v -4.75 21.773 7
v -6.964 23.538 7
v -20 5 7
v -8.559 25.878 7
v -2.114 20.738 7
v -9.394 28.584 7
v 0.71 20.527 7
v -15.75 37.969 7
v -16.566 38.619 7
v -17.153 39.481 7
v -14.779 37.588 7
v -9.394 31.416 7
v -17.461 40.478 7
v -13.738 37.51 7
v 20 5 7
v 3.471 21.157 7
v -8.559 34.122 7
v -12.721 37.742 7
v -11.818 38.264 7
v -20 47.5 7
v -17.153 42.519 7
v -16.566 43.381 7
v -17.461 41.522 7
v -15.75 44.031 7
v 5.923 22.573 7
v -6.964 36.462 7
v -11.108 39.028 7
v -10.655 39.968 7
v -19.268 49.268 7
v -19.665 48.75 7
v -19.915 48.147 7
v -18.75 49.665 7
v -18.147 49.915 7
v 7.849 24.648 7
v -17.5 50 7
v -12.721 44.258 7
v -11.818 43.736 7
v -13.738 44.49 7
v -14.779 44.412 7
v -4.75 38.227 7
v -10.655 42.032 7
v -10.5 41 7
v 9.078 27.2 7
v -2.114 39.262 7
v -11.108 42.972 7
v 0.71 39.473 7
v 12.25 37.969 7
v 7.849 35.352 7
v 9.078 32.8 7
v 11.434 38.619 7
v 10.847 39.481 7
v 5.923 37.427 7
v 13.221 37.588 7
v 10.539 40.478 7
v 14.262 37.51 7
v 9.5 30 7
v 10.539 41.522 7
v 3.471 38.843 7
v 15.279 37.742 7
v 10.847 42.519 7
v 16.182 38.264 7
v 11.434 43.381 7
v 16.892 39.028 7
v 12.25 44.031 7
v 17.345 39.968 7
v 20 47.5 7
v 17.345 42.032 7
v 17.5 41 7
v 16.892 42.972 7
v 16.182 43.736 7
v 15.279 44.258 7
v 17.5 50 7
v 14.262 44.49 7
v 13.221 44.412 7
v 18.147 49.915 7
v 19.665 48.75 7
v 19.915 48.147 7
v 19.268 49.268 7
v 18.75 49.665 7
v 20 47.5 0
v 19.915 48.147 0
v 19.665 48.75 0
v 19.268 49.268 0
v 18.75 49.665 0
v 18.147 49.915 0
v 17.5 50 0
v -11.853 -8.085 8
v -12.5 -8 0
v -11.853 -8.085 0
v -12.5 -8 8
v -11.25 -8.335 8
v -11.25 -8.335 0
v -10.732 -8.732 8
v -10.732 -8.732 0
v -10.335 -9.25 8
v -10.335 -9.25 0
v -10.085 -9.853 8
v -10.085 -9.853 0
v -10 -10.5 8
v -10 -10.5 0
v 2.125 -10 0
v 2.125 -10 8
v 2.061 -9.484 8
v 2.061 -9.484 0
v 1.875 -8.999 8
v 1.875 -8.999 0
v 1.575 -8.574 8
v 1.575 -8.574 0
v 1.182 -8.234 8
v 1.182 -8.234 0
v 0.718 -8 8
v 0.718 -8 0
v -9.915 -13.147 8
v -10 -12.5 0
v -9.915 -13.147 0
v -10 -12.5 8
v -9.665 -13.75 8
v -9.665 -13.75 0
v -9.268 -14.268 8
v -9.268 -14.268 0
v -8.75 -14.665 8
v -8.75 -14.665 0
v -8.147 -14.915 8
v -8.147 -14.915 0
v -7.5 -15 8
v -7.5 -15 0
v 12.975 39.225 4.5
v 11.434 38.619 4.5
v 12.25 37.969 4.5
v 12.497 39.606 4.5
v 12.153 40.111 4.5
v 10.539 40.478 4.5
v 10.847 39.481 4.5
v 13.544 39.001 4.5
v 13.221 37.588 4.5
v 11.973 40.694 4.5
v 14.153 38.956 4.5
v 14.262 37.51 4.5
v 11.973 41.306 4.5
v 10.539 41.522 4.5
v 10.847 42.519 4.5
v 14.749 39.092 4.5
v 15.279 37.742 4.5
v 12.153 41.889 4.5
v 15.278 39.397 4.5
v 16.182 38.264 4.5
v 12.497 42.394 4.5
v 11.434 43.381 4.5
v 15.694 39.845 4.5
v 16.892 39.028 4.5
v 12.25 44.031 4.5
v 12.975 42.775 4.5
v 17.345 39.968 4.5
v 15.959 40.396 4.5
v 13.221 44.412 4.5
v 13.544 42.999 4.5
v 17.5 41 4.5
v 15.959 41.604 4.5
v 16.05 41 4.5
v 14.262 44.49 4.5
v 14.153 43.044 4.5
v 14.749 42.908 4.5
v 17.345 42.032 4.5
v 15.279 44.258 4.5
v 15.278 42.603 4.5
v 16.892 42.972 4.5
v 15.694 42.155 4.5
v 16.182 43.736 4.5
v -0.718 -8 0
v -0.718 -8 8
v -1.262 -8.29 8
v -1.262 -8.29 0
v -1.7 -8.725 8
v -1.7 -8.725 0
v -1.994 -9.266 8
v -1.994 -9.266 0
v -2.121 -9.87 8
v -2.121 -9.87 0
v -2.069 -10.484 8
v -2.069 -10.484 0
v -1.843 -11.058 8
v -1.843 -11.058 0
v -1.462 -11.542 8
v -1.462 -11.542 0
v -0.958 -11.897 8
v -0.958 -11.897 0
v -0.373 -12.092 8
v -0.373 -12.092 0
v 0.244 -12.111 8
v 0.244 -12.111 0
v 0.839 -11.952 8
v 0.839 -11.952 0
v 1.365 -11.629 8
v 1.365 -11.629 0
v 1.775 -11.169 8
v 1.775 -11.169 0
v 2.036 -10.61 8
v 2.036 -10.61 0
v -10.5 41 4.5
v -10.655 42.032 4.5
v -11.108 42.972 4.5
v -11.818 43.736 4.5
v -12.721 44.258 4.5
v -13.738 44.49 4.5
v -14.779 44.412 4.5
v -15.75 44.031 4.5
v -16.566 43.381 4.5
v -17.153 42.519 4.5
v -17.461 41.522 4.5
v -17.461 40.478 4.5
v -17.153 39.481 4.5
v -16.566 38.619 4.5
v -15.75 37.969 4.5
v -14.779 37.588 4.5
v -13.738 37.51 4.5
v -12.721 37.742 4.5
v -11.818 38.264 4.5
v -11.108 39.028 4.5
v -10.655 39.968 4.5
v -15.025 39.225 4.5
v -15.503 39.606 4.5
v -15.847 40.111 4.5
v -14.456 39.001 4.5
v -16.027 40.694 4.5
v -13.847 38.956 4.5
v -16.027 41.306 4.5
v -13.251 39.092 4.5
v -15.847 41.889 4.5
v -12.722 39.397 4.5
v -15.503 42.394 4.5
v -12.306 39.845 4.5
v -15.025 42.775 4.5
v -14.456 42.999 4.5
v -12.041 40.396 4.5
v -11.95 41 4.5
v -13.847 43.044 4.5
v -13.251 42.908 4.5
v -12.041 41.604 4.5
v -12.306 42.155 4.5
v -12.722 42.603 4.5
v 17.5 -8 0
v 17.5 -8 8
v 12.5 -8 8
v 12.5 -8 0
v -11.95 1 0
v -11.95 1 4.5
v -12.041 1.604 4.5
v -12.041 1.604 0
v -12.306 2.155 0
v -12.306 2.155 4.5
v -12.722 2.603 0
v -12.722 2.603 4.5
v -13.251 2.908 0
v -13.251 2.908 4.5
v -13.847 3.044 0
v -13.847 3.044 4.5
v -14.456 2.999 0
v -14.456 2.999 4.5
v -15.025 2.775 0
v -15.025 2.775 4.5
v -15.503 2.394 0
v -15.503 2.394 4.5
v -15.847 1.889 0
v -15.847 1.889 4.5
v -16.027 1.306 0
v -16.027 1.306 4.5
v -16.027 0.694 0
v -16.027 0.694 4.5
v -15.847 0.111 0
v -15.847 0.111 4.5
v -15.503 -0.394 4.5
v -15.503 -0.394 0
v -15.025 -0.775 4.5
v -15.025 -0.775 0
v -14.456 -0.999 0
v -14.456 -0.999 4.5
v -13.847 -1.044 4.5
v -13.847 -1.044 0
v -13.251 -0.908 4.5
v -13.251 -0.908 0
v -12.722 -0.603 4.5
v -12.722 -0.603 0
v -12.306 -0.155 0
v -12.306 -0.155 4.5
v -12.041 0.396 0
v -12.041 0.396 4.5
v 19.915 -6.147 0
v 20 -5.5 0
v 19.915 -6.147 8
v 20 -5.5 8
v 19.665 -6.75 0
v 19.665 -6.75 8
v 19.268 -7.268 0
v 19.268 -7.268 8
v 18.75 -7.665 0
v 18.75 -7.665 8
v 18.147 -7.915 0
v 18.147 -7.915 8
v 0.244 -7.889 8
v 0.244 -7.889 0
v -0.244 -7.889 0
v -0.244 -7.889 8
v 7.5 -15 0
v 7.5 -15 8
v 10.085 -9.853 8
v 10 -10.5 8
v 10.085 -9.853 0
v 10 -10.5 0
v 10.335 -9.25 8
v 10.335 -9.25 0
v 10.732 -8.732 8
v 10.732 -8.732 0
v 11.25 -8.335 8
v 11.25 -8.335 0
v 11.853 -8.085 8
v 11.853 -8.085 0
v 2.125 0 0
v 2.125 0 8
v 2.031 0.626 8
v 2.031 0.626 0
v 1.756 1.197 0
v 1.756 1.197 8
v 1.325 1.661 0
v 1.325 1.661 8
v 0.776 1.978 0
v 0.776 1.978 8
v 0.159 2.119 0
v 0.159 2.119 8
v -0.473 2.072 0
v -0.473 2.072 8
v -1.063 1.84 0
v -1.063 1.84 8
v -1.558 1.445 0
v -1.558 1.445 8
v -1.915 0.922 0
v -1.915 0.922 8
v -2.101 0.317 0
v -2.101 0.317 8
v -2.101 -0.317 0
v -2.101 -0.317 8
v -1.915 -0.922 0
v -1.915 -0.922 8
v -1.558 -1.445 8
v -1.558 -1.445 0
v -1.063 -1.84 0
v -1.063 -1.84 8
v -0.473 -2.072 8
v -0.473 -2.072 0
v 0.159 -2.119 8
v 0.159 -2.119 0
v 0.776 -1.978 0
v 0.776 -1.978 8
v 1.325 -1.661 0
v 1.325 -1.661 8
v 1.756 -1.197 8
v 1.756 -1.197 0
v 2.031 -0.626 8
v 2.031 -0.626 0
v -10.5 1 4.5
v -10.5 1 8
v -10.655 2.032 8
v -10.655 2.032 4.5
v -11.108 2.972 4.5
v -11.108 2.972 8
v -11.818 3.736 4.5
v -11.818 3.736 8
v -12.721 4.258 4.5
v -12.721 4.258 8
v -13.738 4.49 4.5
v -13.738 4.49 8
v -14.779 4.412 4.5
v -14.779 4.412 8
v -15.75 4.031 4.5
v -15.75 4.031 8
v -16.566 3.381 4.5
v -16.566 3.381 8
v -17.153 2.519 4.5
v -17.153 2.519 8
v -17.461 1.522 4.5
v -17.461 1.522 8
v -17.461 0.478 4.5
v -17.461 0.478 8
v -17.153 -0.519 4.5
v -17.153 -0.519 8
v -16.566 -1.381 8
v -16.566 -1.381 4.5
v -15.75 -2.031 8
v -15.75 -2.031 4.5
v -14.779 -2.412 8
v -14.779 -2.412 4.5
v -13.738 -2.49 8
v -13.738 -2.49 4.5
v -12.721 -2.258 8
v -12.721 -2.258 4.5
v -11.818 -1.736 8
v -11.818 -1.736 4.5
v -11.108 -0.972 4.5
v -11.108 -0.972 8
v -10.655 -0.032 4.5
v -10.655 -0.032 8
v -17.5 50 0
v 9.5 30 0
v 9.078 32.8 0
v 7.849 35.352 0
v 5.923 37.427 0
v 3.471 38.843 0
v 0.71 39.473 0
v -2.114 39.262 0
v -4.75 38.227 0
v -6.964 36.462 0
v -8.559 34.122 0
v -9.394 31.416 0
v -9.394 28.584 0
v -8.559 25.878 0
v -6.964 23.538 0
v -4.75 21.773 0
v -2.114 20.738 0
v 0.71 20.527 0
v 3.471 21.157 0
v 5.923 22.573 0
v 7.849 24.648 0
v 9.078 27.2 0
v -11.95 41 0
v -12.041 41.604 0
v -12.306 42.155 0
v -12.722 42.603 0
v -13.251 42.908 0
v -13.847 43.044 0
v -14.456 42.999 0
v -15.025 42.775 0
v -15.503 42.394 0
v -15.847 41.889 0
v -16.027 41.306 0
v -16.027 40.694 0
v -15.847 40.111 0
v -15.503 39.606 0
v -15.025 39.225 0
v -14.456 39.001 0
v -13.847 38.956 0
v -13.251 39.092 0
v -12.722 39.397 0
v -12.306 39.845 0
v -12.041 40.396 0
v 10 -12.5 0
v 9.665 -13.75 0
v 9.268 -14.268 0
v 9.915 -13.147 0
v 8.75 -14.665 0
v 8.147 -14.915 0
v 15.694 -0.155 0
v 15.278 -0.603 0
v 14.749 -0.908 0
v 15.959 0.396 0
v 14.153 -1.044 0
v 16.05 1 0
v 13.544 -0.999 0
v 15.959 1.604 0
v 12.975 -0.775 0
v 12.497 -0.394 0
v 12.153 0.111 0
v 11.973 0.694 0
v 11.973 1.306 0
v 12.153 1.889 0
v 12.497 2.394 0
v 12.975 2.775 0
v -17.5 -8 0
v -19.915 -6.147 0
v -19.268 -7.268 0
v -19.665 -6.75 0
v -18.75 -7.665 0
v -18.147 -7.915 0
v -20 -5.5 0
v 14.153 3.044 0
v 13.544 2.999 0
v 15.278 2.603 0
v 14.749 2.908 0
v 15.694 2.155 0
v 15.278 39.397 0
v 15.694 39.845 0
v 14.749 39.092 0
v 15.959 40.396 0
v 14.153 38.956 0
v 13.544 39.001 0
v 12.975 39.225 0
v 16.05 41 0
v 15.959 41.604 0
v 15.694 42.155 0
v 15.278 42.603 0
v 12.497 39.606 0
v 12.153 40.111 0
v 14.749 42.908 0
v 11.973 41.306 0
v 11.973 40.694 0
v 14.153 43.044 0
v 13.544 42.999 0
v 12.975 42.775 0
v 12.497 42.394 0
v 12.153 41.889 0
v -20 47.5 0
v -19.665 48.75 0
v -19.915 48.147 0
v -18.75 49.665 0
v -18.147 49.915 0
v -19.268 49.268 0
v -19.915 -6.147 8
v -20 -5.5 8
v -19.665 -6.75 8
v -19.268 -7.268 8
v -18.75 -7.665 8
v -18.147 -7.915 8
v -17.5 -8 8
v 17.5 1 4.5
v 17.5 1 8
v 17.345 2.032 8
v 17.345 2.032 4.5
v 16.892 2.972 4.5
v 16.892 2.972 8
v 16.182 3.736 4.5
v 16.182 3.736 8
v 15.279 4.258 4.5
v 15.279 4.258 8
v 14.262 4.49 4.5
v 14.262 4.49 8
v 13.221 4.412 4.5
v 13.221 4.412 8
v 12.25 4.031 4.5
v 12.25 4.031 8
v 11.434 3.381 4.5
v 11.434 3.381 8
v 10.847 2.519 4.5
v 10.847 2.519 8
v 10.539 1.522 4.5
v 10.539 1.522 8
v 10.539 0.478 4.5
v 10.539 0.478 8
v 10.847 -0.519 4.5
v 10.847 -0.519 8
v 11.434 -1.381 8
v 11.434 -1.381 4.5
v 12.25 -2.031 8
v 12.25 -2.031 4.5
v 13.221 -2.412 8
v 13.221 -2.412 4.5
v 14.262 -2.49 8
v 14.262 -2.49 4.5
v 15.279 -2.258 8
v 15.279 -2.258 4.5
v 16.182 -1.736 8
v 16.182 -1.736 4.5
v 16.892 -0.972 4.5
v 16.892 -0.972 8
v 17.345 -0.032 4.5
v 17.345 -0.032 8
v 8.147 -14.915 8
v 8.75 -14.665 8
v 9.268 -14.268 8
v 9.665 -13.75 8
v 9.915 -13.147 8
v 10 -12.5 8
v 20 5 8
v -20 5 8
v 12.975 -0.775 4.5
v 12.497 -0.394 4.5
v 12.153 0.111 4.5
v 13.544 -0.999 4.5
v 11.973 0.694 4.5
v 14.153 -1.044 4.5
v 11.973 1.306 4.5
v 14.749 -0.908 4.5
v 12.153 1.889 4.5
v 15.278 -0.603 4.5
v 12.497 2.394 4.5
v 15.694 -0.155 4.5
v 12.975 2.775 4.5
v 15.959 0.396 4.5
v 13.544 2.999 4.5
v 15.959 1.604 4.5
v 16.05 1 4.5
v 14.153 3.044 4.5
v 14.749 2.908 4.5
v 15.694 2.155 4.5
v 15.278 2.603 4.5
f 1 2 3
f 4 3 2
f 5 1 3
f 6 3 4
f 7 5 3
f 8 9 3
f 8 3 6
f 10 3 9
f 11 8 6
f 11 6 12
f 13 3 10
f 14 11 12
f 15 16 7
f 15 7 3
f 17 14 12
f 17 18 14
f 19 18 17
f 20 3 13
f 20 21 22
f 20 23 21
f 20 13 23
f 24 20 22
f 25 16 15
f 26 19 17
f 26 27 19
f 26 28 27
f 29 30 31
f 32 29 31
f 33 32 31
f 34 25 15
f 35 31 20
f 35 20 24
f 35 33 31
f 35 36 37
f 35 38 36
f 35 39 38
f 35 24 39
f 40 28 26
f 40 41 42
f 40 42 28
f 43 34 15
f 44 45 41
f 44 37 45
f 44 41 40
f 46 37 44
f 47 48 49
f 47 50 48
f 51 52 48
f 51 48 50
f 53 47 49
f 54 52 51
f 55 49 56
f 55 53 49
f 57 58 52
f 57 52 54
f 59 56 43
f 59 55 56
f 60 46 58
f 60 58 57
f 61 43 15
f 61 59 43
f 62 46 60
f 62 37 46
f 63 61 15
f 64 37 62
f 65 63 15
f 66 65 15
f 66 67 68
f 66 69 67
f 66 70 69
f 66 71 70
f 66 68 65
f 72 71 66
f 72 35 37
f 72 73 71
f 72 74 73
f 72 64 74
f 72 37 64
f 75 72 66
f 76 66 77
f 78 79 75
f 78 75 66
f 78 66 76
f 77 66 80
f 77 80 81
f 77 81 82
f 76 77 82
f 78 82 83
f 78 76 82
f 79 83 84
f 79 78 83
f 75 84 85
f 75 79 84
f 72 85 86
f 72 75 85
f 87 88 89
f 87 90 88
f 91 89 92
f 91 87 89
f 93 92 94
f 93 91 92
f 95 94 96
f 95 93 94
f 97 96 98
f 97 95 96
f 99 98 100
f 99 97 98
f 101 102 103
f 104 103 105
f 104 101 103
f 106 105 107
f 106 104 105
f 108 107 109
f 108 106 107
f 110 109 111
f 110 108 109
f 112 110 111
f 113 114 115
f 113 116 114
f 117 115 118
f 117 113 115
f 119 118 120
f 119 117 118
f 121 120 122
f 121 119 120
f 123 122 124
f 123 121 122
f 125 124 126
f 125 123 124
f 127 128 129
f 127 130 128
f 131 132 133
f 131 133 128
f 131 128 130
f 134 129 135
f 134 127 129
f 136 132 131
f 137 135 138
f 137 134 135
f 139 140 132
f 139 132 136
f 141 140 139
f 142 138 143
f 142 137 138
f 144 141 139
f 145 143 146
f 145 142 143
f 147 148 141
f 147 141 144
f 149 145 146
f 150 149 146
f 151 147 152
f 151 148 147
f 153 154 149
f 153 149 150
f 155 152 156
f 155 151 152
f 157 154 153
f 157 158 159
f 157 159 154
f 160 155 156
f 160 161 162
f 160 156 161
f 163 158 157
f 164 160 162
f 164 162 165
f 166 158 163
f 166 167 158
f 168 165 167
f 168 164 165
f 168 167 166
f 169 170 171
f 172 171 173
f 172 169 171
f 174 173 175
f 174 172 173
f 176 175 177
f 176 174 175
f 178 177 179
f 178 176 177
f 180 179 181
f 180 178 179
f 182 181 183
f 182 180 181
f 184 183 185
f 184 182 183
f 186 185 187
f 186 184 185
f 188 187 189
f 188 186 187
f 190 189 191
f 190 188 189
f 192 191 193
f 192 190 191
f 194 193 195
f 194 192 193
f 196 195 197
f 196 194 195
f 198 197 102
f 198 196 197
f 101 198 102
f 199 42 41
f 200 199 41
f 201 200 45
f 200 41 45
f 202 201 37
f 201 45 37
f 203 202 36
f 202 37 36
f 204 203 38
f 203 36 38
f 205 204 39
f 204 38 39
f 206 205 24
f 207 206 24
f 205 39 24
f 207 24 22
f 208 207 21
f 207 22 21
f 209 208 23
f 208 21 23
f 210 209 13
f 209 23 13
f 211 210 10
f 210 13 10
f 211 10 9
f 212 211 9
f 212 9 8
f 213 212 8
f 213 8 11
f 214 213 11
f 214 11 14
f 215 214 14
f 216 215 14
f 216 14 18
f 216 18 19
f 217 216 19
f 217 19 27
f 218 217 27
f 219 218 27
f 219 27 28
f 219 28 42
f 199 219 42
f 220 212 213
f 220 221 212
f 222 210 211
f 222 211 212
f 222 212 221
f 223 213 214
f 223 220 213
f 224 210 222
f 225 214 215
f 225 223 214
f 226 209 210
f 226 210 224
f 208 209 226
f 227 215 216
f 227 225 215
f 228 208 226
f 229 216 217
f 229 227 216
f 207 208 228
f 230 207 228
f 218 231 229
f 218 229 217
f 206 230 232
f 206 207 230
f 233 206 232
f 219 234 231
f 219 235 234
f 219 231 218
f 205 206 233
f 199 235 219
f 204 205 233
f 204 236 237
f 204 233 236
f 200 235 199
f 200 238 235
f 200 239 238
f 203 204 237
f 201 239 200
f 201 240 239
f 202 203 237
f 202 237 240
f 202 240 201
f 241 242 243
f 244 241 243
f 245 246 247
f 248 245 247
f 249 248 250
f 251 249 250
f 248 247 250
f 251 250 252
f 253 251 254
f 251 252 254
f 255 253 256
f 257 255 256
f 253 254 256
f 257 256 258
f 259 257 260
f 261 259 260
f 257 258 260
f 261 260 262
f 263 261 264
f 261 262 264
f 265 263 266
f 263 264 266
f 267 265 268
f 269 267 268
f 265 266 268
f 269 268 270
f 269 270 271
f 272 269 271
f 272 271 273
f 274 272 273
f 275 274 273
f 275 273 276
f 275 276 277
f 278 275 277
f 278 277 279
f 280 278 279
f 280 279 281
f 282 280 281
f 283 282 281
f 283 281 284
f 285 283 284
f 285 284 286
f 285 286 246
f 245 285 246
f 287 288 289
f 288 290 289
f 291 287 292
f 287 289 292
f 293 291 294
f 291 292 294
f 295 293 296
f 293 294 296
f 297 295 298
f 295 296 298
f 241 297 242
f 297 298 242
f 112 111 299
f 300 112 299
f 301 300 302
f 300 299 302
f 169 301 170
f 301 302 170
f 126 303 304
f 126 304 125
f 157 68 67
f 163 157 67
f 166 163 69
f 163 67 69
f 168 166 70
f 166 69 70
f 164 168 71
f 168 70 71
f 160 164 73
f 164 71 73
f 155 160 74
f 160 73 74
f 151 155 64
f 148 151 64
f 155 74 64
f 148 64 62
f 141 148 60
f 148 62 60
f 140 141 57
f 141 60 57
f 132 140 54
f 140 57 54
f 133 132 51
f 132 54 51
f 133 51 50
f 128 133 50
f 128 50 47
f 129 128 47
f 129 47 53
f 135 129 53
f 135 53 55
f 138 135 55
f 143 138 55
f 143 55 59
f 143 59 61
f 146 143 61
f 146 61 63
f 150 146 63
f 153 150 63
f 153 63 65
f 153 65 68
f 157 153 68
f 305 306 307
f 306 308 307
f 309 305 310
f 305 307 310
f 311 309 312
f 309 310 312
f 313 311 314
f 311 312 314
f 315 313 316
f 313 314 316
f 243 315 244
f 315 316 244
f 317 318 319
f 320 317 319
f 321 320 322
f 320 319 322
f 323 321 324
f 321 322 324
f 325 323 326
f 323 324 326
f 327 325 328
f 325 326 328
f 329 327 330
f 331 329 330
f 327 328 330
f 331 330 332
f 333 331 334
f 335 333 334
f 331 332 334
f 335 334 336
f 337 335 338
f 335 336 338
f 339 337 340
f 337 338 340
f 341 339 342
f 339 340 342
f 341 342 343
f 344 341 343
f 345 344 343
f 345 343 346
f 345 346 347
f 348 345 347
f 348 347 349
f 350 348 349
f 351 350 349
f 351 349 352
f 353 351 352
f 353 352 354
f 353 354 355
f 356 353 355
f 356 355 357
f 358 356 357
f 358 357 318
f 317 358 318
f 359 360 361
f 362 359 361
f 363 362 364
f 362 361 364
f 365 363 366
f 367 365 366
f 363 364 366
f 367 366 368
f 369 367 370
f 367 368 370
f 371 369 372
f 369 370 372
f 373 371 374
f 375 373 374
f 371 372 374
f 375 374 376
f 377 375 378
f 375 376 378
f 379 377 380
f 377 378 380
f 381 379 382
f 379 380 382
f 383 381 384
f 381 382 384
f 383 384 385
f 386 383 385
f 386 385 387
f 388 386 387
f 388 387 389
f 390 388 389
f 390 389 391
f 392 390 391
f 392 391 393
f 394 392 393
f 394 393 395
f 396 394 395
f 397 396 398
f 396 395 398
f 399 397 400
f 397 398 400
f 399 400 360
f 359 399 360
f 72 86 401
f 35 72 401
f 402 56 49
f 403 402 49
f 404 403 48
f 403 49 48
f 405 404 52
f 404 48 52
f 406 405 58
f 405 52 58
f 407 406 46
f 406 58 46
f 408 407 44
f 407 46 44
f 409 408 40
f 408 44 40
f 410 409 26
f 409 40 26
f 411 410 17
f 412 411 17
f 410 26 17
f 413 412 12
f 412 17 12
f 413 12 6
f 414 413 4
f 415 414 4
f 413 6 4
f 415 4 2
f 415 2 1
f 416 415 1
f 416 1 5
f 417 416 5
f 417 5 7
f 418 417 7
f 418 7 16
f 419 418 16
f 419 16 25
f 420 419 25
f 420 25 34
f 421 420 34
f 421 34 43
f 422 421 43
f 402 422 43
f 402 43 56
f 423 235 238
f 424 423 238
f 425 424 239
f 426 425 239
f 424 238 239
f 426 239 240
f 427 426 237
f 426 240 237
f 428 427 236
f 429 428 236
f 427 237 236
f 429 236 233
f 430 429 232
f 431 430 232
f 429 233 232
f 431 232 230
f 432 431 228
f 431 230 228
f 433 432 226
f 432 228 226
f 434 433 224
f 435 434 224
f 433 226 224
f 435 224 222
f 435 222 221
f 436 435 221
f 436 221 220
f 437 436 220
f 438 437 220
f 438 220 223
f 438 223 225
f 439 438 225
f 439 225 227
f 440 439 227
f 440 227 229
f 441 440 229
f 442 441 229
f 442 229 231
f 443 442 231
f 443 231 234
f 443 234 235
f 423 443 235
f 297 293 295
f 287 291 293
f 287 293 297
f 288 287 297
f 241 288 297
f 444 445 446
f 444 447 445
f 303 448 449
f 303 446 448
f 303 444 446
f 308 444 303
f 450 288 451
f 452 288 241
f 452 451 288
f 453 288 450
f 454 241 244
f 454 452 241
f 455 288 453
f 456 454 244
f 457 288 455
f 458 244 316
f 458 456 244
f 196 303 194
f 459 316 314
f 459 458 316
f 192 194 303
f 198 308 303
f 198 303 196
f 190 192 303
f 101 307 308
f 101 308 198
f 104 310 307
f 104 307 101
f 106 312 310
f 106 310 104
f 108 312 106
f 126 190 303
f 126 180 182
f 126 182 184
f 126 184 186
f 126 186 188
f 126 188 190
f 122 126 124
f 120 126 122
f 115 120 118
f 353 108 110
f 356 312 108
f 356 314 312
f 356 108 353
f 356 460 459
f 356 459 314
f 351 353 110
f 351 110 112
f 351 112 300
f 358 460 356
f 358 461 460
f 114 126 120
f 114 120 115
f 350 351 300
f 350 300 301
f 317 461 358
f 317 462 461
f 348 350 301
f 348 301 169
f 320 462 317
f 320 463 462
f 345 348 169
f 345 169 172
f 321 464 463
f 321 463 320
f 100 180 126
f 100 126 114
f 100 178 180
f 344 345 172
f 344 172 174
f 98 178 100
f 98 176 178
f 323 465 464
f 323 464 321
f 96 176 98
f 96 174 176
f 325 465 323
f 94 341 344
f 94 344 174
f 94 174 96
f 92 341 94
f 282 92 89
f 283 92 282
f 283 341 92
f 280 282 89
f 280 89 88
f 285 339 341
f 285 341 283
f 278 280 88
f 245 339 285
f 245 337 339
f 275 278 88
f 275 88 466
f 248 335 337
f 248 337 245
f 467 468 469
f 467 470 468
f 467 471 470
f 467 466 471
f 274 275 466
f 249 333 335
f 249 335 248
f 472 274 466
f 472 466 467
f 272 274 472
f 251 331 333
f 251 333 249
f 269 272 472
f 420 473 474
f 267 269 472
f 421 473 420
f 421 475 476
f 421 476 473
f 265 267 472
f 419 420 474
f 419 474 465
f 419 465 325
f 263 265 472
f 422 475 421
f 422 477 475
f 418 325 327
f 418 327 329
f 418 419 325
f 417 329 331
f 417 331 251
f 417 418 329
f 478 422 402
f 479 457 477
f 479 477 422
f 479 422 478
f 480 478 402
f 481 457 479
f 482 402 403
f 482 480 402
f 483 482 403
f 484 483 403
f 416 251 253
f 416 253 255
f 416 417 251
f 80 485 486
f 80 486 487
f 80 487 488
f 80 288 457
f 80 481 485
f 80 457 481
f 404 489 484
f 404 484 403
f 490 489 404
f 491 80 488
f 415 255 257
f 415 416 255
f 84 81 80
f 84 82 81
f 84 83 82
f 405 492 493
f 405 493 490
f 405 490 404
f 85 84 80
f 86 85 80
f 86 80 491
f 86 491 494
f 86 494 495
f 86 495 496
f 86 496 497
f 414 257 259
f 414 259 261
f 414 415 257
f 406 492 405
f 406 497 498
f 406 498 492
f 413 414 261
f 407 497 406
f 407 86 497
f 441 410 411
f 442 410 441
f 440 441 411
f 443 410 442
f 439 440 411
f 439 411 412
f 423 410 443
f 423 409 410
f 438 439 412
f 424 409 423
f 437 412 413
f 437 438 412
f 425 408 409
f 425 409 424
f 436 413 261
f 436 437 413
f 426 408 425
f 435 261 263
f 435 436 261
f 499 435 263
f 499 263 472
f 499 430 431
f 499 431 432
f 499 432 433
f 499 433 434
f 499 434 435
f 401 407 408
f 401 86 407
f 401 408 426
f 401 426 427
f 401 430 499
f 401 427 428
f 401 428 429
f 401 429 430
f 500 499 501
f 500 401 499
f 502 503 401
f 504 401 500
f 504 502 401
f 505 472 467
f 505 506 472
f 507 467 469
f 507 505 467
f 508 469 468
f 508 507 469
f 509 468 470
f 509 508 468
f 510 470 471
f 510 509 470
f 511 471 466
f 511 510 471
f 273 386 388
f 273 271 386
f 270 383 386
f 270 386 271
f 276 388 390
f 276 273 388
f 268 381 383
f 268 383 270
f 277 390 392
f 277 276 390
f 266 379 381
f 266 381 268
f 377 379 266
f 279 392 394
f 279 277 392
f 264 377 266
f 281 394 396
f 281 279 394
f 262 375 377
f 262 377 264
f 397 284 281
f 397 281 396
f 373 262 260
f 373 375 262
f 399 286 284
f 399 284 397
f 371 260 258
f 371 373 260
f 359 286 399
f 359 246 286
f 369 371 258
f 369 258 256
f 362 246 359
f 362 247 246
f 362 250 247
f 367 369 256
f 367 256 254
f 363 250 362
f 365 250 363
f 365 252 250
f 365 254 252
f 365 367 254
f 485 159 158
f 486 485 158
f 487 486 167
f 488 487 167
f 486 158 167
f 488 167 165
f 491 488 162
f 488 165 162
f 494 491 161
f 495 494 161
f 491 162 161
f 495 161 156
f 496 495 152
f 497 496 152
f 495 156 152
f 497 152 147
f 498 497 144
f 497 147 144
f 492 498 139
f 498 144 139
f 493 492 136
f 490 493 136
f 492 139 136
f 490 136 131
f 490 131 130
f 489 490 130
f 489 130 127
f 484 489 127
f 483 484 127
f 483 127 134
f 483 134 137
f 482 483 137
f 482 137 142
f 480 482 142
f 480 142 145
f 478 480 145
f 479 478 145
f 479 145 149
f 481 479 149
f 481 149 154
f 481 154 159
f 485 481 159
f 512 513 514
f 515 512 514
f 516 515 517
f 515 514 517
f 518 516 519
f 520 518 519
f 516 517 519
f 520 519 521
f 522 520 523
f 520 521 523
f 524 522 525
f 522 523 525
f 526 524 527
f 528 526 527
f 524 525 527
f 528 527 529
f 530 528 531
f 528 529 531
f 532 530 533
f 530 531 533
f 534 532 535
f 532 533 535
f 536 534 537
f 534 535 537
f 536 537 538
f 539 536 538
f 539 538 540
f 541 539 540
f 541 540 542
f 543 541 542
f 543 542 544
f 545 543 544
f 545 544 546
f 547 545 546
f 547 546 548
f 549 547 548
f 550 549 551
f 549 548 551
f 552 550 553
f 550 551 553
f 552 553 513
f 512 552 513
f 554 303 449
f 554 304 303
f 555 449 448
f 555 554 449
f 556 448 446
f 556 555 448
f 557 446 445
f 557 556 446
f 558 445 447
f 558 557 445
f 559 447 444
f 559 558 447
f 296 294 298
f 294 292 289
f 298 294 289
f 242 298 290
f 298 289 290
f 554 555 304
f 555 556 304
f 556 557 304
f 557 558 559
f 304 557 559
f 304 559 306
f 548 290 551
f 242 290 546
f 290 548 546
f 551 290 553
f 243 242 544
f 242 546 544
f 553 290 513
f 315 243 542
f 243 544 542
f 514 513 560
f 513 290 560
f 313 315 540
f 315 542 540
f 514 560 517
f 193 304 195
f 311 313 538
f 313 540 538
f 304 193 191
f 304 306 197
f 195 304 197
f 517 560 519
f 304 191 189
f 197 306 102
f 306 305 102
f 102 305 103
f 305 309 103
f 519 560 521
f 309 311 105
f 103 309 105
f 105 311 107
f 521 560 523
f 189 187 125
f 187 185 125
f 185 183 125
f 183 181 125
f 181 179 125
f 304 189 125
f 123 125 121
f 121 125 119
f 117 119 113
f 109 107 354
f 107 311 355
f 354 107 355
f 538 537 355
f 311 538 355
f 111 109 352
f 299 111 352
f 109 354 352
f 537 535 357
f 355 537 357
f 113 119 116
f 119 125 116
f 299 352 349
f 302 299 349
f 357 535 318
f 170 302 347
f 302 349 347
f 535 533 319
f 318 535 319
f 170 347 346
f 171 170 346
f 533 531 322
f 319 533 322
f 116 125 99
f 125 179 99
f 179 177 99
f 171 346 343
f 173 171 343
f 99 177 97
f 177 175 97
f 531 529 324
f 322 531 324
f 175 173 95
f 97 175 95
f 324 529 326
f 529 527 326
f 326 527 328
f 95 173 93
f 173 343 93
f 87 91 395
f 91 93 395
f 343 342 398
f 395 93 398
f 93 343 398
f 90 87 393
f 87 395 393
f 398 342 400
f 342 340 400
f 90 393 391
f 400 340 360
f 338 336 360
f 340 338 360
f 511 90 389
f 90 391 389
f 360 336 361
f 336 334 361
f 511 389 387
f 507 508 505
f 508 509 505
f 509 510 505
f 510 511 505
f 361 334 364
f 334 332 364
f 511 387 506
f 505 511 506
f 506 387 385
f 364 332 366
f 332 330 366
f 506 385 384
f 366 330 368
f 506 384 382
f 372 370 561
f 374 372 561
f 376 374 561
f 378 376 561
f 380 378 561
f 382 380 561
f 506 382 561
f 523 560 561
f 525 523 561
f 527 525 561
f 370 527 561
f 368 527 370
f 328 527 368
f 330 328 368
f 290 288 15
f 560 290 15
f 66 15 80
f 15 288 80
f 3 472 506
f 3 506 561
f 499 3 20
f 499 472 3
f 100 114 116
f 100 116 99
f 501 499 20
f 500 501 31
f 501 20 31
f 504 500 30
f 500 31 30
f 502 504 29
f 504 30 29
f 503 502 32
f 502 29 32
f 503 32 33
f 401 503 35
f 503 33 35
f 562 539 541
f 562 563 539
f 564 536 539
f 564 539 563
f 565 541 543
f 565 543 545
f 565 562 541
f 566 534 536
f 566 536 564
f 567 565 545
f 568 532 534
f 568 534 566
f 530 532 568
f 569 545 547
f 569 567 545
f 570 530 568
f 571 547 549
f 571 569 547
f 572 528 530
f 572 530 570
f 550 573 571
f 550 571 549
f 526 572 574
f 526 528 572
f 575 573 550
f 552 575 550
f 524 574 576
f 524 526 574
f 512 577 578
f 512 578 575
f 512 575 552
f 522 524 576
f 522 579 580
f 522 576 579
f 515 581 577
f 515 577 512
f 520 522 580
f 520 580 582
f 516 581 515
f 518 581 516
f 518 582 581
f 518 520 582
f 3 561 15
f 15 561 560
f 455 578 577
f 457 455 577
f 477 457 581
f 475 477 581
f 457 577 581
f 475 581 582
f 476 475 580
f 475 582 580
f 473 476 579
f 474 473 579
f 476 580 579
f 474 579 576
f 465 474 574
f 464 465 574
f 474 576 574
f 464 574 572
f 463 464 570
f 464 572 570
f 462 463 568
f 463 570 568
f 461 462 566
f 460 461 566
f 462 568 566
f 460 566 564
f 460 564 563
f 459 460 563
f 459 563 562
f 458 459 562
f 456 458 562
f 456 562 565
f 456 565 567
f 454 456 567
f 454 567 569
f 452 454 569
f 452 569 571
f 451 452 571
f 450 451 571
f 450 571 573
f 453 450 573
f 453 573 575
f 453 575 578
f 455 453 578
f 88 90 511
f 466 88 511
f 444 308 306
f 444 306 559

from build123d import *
from build123d.topology import SkipClean

# Parameters (mm, degrees)
SKETCH1_R           = 2.125
BOSS_EXTRUDE2_DEPTH = 8
SKETCH7_W           = 40
SKETCH7_H           = 58
BOSS_EXTRUDE3_DEPTH = 8
FILLET1_R           = 2.5
SKETCH3_R           = 9.5
CUT_EXTRUDE2_DEPTH  = 55.442630355
SKETCH2_R           = 2.05
CUT_EXTRUDE1_DEPTH  = 55.442630355
SKETCH6_W           = 60
SKETCH6_H           = 50
CUT_EXTRUDE5_DEPTH  = 1
SKETCH9_R           = 2.125
CUT_EXTRUDE7_DEPTH  = 55.442630355
SKETCH11_R          = 3.5
CUT_EXTRUDE9_DEPTH  = 3.5


with BuildPart() as part:
    # Sketch1 → Boss-Extrude2 (new body)
    with BuildSketch(Plane.XY):
        with BuildLine():
            Line((-10, -15), (-10, 15))
            Line((-10, 15), (-15, 30))
            ThreePointArc((-15, 30), (0, 45), (15, 30))
            Line((15, 30), (10, 15))
            Line((10, 15), (10, -15))
            Line((10, -15), (-10, -15))
        make_face()
        Circle(SKETCH1_R, mode=Mode.SUBTRACT)
        with Locations((0, -10)):
            Circle(SKETCH1_R, mode=Mode.SUBTRACT)
    extrude(amount=BOSS_EXTRUDE2_DEPTH)

    # Sketch7 → Boss-Extrude3 (add)
    with BuildSketch(Plane(origin=(0, 0, 0), x_dir=(-1, 0, 0), z_dir=(0, 0, -1))):
        with Locations((0, 21)):
            Rectangle(SKETCH7_W, SKETCH7_H)
    extrude(amount=-BOSS_EXTRUDE3_DEPTH)

    # Fillet1
    fillet1_edges = [part.edges().sort_by_distance(p)[0] for p in [
        (10, -15, 4),
        (-10, -15, 4),
        (-20, -8, 4),
        (-10, -8, 4),
        (10, -8, 4),
        (-20, 50, 4),
        (20, 50, 4),
        (20, -8, 4),
    ]]
    fillet(fillet1_edges, radius=FILLET1_R)

    # Sketch3 → Cut-Extrude2 (cut, through all)
    with BuildSketch(Plane.XY.offset(8)):
        with Locations((0, 30)):
            Circle(SKETCH3_R)
    extrude(amount=-CUT_EXTRUDE2_DEPTH, mode=Mode.SUBTRACT)

    # Sketch2 → Cut-Extrude1 (cut, through all)
    with BuildSketch(Plane.XY.offset(8)):
        with Locations((-14, 41)):
            Circle(SKETCH2_R)
        with Locations((14, 41)):
            Circle(SKETCH2_R)
        with Locations((14, 1)):
            Circle(SKETCH2_R)
        with Locations((-14, 1)):
            Circle(SKETCH2_R)
    extrude(amount=-CUT_EXTRUDE1_DEPTH, mode=Mode.SUBTRACT)

    # Sketch6 → Cut-Extrude5 (cut)
    with BuildSketch(Plane.XY.offset(8)):
        with Locations((0, 30)):
            Rectangle(SKETCH6_W, SKETCH6_H)
    extrude(amount=-CUT_EXTRUDE5_DEPTH, mode=Mode.SUBTRACT)

    # Sketch9 → Cut-Extrude7 (cut, through all)
    with SkipClean():  # the faces are left unmerged after this step: merging them gives an invalid solid
        with BuildSketch(Plane.XY.offset(8)):
            with Locations((0, -10)):
                Circle(SKETCH9_R)
            Circle(SKETCH9_R)
        extrude(amount=-CUT_EXTRUDE7_DEPTH, mode=Mode.SUBTRACT)

    # Sketch11 → Cut-Extrude9 (cut)
    with SkipClean():  # the faces are left unmerged after this step: merging them gives an invalid solid
        with BuildSketch(Plane.XY.offset(8)):
            with Locations((-14, 1)):
                Circle(SKETCH11_R)
            with Locations((14, 1)):
                Circle(SKETCH11_R)
            with Locations((14, 41)):
                Circle(SKETCH11_R)
            with Locations((-14, 41)):
                Circle(SKETCH11_R)
        extrude(amount=-CUT_EXTRUDE9_DEPTH, mode=Mode.SUBTRACT)


solid = part.part
